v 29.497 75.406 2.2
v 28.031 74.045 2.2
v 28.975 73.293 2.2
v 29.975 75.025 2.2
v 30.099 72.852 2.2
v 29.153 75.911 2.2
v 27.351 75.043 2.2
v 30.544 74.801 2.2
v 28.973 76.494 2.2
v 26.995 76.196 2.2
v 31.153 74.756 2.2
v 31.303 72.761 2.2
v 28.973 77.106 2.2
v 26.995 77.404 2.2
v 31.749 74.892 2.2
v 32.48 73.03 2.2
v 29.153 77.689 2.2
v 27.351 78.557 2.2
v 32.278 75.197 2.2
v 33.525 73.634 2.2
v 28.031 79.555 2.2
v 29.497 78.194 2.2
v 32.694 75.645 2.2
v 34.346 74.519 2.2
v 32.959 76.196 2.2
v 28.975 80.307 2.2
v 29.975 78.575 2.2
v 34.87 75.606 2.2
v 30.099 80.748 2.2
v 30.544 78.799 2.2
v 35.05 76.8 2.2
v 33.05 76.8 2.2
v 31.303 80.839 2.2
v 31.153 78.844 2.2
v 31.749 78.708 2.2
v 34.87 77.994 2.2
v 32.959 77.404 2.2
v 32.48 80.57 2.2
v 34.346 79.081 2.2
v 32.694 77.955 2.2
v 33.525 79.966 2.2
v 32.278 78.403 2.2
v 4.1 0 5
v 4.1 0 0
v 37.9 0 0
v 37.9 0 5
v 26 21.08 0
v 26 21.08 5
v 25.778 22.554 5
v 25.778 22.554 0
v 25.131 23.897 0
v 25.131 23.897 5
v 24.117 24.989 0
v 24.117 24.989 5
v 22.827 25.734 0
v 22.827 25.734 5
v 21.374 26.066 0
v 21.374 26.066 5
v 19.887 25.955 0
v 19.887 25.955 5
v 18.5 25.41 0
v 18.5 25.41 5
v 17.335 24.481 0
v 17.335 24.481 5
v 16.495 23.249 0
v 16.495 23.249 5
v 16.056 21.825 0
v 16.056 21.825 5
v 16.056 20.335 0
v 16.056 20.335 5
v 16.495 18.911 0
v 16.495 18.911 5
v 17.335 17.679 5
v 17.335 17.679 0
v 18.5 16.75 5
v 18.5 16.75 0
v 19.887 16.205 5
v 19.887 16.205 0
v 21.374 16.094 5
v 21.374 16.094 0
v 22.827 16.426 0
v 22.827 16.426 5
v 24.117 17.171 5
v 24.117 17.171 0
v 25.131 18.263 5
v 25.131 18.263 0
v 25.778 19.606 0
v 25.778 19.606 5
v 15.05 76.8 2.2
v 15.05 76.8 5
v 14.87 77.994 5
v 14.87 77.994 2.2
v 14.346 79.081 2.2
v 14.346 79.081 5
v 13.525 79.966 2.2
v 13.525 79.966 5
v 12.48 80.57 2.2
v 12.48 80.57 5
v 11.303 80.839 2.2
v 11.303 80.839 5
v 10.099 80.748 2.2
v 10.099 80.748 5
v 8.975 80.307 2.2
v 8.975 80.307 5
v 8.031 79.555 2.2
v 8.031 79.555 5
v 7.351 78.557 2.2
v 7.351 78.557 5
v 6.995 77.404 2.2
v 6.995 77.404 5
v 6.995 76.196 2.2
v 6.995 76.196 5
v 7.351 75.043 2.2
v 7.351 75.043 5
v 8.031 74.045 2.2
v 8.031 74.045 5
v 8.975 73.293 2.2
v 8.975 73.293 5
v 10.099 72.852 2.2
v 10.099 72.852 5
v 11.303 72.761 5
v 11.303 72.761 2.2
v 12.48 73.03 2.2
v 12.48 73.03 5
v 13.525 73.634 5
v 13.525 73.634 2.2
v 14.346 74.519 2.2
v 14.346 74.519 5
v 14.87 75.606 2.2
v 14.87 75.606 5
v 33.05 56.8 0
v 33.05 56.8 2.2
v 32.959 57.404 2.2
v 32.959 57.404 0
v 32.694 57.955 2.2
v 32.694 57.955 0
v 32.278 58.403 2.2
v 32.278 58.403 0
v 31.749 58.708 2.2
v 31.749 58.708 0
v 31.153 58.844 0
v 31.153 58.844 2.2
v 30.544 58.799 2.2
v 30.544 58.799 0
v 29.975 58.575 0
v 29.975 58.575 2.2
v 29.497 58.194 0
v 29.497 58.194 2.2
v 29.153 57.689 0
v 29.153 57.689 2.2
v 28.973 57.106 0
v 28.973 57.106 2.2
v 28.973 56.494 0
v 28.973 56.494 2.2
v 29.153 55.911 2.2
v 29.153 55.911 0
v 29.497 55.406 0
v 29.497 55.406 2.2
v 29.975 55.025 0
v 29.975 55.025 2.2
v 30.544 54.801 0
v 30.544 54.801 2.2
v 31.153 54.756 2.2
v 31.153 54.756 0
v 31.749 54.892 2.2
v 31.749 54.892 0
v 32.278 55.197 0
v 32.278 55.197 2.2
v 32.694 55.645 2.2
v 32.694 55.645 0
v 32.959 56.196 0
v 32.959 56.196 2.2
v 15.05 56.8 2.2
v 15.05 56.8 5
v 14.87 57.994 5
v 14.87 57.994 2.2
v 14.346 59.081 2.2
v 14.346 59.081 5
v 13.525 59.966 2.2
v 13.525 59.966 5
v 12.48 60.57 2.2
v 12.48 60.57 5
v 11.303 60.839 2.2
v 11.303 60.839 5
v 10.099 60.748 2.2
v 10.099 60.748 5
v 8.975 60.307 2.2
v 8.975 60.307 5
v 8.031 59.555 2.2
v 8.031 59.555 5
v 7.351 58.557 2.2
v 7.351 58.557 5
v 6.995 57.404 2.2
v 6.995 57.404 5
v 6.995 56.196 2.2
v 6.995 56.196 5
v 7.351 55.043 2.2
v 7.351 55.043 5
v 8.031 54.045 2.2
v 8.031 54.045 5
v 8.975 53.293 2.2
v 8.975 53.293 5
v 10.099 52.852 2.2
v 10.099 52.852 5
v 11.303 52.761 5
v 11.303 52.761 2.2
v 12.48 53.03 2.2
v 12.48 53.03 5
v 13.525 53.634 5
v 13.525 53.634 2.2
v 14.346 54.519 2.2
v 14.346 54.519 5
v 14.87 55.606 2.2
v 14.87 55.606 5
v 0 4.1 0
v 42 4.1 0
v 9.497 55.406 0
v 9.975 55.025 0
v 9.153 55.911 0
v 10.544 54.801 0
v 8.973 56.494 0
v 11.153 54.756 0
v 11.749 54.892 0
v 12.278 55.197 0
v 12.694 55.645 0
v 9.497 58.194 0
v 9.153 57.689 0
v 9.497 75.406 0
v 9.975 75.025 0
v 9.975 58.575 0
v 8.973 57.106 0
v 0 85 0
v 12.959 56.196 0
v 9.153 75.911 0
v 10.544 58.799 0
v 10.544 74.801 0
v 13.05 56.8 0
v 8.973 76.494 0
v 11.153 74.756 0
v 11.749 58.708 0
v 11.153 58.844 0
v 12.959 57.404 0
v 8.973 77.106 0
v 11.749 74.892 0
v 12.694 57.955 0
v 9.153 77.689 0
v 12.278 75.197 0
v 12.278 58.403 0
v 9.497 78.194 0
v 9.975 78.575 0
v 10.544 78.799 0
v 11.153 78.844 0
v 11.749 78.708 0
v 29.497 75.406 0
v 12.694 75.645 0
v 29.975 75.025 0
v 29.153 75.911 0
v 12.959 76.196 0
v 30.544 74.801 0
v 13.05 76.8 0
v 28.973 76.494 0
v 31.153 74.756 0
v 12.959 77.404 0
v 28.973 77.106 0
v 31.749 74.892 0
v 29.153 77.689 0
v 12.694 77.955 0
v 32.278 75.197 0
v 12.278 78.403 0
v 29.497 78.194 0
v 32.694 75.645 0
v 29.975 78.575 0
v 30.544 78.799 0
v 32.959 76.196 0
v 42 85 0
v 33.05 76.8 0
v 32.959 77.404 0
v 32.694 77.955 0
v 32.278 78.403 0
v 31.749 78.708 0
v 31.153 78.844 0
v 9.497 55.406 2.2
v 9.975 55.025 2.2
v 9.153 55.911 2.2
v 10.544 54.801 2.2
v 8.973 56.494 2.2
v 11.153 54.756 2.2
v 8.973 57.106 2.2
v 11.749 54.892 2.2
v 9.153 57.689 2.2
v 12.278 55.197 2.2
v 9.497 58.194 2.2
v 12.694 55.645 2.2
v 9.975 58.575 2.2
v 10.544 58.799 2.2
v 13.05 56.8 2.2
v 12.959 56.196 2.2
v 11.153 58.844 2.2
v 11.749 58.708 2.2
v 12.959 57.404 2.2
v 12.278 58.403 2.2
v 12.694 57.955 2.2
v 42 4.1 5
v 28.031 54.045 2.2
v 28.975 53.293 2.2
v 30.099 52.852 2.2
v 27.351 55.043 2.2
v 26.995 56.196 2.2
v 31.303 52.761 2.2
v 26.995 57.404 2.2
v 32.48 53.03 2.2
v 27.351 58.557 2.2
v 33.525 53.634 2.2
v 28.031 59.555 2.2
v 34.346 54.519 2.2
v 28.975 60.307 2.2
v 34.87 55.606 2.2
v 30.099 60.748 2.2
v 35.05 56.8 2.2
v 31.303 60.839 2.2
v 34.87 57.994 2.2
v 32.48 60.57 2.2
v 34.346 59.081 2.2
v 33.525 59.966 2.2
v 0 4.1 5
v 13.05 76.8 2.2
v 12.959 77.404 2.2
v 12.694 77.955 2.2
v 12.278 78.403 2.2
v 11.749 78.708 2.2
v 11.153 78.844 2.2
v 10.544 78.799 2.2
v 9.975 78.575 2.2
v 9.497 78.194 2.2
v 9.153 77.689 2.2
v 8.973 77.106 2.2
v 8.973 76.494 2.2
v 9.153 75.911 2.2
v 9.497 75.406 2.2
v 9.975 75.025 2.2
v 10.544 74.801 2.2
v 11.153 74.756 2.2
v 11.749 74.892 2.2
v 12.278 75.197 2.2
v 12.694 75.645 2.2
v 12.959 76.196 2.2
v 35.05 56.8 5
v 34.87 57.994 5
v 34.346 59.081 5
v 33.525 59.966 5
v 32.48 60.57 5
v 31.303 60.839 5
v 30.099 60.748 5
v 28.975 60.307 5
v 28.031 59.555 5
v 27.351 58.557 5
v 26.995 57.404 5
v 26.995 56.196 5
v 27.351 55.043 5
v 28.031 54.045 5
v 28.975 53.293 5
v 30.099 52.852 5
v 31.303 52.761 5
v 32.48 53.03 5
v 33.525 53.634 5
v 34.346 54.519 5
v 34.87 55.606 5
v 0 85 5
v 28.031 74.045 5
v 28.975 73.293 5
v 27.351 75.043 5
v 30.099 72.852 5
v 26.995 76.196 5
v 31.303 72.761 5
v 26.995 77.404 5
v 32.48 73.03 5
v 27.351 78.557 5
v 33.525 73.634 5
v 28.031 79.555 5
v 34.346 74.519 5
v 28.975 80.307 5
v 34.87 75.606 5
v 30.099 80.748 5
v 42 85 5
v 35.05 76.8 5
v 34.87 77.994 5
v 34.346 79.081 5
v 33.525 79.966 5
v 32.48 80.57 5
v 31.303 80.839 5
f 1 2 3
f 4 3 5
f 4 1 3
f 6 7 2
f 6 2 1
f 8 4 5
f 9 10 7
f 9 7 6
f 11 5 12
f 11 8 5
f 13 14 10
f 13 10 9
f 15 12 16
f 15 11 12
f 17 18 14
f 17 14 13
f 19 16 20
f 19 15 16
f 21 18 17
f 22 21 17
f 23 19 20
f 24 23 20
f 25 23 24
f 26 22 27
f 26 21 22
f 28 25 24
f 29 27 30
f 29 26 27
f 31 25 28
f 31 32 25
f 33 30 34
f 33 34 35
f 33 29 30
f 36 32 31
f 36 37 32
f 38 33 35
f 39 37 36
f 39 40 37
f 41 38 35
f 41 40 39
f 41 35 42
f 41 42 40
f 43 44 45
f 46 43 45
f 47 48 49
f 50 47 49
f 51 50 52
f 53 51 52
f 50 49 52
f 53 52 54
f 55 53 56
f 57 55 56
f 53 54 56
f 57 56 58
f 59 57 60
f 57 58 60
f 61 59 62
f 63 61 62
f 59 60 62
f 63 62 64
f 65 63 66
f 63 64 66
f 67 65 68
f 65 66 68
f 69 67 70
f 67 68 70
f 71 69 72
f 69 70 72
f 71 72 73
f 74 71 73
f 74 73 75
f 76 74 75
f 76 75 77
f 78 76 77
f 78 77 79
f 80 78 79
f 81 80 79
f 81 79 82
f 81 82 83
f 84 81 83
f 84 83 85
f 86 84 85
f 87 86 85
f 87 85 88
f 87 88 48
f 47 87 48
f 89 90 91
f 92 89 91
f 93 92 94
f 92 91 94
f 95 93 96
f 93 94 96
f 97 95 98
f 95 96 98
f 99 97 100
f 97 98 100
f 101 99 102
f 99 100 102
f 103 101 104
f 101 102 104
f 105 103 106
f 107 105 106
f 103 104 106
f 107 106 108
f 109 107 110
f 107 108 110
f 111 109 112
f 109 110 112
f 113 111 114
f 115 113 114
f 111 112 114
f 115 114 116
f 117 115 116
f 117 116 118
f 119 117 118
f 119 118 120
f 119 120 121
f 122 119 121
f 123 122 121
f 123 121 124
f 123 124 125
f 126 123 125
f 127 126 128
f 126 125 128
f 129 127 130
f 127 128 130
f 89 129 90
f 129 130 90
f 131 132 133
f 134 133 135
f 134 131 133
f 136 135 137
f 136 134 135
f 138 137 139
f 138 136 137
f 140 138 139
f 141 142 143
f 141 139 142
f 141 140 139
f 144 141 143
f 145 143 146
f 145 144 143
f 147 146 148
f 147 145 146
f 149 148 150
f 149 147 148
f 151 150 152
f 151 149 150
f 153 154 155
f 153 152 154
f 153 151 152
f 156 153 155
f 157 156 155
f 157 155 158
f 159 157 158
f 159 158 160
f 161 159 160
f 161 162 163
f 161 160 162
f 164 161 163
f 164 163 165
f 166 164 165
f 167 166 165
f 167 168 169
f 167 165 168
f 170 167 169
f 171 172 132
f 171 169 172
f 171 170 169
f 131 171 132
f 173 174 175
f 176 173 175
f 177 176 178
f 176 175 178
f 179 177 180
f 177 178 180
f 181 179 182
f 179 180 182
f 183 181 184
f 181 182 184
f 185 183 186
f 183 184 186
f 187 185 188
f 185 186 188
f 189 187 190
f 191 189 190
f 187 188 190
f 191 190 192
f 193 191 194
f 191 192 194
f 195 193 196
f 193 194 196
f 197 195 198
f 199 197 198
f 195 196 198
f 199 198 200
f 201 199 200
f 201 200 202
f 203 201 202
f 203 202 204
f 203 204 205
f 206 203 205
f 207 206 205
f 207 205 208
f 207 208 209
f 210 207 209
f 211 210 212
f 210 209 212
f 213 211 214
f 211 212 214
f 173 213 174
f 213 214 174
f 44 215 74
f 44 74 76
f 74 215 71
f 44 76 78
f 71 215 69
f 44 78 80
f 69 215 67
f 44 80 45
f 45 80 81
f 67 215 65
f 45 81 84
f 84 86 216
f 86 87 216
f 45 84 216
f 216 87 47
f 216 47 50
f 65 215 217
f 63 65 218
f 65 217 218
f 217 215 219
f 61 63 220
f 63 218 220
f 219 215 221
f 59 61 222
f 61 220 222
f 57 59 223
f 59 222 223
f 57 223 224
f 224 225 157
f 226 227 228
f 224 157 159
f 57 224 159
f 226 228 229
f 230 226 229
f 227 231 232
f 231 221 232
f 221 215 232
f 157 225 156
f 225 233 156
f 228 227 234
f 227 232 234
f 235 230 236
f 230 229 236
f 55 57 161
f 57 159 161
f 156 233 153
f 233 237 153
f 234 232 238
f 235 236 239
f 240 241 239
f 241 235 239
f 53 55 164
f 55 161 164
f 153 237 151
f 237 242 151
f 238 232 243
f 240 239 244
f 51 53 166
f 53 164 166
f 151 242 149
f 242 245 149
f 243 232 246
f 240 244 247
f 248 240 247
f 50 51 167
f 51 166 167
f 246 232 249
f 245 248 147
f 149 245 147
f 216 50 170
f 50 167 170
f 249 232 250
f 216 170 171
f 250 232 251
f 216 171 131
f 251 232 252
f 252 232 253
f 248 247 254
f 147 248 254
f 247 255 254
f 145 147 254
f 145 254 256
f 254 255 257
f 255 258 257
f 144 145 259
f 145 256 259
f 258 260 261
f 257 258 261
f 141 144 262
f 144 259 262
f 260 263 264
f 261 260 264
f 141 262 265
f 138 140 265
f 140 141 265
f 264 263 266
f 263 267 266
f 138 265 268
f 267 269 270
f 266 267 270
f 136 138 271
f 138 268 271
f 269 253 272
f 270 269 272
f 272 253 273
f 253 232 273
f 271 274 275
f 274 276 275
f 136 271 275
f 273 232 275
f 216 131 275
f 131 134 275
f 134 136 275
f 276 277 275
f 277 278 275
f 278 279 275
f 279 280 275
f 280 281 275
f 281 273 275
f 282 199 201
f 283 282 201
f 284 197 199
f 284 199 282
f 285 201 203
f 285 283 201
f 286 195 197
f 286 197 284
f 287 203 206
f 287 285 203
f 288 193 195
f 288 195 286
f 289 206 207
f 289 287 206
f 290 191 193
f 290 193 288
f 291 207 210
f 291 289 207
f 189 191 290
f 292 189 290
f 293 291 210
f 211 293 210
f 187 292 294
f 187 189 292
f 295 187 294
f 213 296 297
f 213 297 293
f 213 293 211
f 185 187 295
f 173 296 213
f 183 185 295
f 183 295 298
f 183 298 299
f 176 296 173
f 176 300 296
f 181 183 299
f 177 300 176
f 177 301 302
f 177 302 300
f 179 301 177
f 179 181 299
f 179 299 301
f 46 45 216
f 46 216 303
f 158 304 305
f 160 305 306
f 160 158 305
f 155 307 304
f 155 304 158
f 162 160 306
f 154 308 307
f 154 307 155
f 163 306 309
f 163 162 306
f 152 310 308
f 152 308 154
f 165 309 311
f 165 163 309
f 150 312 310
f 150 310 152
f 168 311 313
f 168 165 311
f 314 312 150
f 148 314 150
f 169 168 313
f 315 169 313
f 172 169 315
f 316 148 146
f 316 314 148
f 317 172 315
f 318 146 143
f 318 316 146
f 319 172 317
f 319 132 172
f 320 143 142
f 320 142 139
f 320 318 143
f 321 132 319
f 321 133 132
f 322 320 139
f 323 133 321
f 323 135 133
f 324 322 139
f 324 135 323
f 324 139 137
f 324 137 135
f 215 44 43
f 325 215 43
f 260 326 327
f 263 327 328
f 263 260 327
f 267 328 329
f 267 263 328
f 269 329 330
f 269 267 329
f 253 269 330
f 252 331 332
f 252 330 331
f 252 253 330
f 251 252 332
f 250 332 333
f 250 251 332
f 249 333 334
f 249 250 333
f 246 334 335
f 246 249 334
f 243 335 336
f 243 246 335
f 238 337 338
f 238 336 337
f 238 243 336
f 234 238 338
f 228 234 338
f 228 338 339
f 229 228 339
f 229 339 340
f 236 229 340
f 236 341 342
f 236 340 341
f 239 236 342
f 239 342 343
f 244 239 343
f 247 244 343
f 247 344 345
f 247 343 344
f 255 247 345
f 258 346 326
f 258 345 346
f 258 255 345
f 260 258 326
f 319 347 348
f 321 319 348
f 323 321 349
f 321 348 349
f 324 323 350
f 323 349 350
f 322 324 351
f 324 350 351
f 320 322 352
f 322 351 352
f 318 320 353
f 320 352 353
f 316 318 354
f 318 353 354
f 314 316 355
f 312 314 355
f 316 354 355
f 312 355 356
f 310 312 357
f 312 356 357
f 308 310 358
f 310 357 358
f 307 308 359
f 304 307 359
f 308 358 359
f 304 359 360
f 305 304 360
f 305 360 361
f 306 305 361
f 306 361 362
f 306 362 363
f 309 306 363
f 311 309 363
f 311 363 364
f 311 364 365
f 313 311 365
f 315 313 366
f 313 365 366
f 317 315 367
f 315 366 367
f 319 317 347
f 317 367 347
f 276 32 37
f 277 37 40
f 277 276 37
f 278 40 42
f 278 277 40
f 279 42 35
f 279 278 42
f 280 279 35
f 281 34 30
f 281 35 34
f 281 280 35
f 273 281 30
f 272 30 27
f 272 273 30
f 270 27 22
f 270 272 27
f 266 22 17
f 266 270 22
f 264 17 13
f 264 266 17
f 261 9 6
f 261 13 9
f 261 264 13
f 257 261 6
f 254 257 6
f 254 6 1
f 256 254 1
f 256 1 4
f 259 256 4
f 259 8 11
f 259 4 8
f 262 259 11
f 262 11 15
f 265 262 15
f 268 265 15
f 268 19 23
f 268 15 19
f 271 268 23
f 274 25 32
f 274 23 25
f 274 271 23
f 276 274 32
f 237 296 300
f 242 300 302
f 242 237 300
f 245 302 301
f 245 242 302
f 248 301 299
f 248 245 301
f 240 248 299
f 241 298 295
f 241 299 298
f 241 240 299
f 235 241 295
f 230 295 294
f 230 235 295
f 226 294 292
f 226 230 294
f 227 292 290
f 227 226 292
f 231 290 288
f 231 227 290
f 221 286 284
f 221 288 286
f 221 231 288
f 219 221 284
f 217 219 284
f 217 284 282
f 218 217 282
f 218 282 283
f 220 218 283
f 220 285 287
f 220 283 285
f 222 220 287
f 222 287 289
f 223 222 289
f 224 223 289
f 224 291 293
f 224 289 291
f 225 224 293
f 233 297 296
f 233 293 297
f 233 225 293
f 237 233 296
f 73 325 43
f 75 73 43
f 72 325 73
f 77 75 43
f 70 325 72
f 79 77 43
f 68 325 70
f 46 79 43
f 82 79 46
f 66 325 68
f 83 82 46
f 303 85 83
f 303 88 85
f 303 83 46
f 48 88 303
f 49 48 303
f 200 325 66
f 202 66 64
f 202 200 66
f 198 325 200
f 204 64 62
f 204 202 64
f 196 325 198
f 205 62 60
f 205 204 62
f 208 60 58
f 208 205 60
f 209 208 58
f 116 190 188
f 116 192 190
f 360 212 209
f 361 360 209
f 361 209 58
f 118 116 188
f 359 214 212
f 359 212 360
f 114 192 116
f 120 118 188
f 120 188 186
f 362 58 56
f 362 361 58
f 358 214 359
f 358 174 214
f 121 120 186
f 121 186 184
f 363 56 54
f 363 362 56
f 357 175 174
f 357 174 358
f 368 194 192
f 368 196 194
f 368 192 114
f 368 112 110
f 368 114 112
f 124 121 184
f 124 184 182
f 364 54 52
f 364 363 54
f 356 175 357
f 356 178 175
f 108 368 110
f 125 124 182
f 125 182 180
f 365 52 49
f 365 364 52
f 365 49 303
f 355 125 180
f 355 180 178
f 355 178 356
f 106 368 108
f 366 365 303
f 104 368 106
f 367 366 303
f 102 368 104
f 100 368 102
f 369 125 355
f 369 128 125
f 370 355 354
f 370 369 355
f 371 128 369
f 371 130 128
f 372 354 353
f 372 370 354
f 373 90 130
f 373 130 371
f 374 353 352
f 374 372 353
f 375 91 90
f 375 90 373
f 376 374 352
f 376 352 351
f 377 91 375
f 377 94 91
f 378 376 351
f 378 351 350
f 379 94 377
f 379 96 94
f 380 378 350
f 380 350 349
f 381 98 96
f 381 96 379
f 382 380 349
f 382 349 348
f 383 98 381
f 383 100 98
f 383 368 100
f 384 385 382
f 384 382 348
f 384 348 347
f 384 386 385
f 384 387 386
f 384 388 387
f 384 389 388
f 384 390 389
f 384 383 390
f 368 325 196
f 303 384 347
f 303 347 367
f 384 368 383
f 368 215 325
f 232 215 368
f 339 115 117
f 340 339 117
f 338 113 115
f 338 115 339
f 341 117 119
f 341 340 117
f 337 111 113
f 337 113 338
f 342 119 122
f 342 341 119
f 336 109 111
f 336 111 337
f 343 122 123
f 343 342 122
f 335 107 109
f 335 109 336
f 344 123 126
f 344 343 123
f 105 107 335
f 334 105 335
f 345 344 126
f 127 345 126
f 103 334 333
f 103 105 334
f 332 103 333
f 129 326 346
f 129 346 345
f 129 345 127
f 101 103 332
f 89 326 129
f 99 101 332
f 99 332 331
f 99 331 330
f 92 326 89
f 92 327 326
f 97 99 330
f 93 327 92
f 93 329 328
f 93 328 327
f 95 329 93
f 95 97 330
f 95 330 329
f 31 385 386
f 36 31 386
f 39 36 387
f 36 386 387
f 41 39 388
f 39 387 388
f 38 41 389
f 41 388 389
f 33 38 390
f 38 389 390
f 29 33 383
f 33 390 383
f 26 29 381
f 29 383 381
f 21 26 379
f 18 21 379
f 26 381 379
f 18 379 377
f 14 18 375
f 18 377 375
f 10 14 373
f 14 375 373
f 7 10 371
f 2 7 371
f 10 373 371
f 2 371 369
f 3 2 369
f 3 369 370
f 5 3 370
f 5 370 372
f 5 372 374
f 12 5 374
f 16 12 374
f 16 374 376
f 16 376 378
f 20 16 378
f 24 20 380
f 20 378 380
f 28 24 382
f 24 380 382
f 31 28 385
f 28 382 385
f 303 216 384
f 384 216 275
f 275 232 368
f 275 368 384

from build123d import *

# Parameters (mm, degrees)
CROQUIS1_W              = 42
CROQUIS1_H              = 85
CROQUIS1_R              = 2.05
SALIENTE_EXTRUIR1_DEPTH = 5
CROQUIS4_R              = 4.05
CORTAR_EXTRUIR1_DEPTH   = 2.8
CHAFL_N1_SIZE           = 4.1
CROQUIS7_R              = 5
CORTAR_EXTRUIR4_DEPTH   = 6


with BuildPart() as part:
    # Croquis1 → Saliente-Extruir1 (new body)
    with BuildSketch(Plane.XY):
        with Locations((21, 42.5)):
            Rectangle(CROQUIS1_W, CROQUIS1_H)
        with Locations((11, 76.8)):
            Circle(CROQUIS1_R, mode=Mode.SUBTRACT)
        with Locations((31, 76.8)):
            Circle(CROQUIS1_R, mode=Mode.SUBTRACT)
        with Locations((31, 56.8)):
            Circle(CROQUIS1_R, mode=Mode.SUBTRACT)
        with Locations((11, 56.8)):
            Circle(CROQUIS1_R, mode=Mode.SUBTRACT)
    extrude(amount=SALIENTE_EXTRUIR1_DEPTH)

    # Croquis4 → Cortar-Extruir1 (cut)
    with BuildSketch(Plane.XY.offset(5)):
        with Locations((11, 76.8)):
            Circle(CROQUIS4_R)
        with Locations((11, 56.8)):
            Circle(CROQUIS4_R)
        with Locations((31, 56.8)):
            Circle(CROQUIS4_R)
        with Locations((31, 76.8)):
            Circle(CROQUIS4_R)
    extrude(amount=-CORTAR_EXTRUIR1_DEPTH, mode=Mode.SUBTRACT)

    # Chaflán1
    chafl_n1_edges = [part.edges().sort_by_distance(p)[0] for p in [
        (42, 0, 2.5),
        (0, 0, 2.5),
    ]]
    chamfer(chafl_n1_edges, length=CHAFL_N1_SIZE)

    # Croquis7 → Cortar-Extruir4 (cut, through all)
    with BuildSketch(Plane.XY.offset(5)):
        with Locations((21, 21.08)):
            Circle(CROQUIS7_R)
    extrude(amount=-CORTAR_EXTRUIR4_DEPTH, mode=Mode.SUBTRACT)


solid = part.part
